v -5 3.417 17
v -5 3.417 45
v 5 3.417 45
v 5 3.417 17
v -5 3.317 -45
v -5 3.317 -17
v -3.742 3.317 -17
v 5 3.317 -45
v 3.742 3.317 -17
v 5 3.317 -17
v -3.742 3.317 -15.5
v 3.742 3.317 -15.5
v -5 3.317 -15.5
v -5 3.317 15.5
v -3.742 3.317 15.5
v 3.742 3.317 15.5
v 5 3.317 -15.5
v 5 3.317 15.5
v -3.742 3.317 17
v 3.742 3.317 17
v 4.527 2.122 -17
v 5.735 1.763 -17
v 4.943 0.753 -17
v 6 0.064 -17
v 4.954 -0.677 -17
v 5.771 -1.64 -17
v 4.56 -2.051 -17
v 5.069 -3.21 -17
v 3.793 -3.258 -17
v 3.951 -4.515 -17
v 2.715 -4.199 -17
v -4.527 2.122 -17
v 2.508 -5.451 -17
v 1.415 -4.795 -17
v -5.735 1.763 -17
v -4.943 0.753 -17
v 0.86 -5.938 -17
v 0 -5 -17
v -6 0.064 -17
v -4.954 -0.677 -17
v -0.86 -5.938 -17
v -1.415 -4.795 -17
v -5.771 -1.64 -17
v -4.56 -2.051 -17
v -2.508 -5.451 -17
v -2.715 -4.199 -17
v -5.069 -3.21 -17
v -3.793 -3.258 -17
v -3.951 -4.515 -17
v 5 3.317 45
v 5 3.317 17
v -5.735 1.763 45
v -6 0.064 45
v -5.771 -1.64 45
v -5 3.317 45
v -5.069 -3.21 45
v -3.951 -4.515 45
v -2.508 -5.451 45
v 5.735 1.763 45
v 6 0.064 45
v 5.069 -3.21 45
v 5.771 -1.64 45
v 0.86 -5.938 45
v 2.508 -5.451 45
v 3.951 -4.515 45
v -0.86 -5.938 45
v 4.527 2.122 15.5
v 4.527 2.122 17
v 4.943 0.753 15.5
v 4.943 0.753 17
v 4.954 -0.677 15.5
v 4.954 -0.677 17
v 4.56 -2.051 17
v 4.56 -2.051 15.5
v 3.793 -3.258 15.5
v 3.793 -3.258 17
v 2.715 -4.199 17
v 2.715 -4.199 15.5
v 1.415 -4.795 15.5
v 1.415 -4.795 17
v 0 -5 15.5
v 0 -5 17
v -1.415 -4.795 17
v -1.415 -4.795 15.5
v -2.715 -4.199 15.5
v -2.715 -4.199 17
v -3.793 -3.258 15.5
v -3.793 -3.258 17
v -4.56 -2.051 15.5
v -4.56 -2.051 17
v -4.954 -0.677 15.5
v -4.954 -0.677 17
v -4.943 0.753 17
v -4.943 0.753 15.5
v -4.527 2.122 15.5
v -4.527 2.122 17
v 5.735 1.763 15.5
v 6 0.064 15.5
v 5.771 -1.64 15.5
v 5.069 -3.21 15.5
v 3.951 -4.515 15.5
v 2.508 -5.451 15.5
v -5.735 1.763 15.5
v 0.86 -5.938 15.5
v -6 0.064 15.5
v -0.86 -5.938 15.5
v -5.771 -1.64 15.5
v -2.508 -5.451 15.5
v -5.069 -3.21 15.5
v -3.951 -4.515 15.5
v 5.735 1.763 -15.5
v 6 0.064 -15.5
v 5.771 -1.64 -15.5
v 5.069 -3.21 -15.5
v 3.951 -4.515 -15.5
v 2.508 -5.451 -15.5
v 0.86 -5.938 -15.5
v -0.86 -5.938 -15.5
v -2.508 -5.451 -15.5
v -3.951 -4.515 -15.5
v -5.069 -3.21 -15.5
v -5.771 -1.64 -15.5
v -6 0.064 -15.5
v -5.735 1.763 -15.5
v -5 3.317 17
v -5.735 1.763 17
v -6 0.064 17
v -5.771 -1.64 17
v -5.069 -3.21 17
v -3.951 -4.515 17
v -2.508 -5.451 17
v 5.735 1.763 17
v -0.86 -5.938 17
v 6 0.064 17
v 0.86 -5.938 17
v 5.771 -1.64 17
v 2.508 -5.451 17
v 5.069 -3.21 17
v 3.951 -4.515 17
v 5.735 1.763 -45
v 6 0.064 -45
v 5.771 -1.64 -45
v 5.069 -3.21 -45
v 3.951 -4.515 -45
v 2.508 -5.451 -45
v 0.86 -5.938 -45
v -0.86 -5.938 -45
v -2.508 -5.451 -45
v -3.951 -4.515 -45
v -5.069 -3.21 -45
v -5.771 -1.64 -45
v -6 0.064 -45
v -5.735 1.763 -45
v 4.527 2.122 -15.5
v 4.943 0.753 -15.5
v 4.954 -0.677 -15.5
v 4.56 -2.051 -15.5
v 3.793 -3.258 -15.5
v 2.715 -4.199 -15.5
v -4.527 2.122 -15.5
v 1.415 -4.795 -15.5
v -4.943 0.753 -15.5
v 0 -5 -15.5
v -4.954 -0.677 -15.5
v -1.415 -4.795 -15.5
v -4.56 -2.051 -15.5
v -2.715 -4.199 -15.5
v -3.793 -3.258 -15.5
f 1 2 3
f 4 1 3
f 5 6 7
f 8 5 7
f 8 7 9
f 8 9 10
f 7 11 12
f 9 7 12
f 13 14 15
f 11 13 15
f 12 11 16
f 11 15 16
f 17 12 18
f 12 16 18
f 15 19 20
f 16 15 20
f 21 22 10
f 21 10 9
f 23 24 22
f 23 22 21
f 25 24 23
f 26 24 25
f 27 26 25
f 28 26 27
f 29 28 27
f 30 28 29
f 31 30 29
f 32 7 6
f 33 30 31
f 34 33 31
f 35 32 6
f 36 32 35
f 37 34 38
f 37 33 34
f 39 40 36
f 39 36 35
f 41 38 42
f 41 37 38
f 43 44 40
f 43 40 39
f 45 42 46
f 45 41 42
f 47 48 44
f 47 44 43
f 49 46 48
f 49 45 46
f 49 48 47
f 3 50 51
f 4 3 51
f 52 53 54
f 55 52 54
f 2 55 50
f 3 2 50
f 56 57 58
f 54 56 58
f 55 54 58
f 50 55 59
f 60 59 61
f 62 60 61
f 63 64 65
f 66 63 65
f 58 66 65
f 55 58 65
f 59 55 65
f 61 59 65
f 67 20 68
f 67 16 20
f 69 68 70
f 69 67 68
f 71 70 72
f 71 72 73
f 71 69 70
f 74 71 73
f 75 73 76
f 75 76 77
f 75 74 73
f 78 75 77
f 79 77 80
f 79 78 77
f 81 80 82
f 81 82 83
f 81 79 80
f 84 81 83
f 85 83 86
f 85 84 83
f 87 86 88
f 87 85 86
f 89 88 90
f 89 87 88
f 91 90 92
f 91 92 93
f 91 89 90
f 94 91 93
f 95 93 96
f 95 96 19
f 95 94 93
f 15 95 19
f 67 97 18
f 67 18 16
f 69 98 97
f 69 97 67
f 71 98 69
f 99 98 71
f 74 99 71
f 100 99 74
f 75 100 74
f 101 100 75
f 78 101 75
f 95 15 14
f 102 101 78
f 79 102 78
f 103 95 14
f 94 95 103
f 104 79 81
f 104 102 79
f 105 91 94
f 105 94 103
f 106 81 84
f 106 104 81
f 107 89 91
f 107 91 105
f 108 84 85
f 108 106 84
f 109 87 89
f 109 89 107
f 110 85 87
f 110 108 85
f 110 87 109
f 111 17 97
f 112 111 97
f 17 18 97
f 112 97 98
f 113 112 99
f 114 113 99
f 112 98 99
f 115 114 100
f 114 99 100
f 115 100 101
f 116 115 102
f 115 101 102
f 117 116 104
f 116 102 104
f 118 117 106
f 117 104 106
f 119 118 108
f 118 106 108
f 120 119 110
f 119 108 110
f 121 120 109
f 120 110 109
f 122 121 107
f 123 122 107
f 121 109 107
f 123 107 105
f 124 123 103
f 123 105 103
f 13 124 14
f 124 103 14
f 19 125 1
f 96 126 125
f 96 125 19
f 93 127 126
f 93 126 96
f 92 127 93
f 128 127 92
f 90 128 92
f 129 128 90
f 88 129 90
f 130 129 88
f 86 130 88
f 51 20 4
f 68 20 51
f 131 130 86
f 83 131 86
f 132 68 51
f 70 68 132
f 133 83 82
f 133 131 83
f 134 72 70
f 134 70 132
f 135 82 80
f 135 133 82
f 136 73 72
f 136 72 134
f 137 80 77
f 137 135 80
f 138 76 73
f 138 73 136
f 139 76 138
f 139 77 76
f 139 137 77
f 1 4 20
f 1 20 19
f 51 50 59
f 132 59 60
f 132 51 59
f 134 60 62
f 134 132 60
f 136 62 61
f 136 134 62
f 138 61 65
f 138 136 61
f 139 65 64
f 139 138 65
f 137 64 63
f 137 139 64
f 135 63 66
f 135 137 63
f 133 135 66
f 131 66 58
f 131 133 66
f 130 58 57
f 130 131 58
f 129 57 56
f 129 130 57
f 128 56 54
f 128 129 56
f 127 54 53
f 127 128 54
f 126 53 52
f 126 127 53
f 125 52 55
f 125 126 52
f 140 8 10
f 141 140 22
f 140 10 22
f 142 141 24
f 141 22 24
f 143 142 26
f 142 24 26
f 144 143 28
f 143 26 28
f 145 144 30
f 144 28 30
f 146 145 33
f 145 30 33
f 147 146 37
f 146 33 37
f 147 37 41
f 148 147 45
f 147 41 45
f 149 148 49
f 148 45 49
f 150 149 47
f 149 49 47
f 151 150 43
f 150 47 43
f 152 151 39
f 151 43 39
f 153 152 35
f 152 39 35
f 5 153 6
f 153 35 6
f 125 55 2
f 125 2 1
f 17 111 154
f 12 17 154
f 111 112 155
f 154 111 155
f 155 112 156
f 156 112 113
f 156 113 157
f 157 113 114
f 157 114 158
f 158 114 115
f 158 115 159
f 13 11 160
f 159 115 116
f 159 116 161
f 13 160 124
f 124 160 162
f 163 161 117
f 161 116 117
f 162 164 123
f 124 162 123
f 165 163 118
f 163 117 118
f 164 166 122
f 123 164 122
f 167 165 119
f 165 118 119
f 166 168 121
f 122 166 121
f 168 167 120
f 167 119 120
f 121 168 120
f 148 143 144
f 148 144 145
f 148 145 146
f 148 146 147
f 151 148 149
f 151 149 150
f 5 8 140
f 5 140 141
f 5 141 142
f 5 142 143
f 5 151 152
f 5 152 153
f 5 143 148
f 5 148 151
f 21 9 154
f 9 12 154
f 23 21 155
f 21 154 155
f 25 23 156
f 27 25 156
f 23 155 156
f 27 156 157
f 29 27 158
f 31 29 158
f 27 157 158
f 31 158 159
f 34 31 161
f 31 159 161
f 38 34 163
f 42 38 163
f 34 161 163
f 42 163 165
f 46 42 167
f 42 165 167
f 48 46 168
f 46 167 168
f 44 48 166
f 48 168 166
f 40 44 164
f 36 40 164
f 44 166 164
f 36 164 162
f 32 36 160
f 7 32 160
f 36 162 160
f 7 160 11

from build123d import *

# Parameters (mm, degrees)
EXTRUDE_1_DEPTH = 45
SKETCH_2_W      = 1
SKETCH_2_H      = 1.5
SKETCH_3_W      = 10
SKETCH_3_H      = 28
EXTRUDE_2_DEPTH = 0.1


with BuildPart() as part:
    # Эскиз1 → Бобышка-Вытянуть1 (new body)
    with BuildSketch(Plane.XY):
        with BuildLine():
            Line((-5, 3.31662479), (5, 3.31662479))
            ThreePointArc((5, 3.31662479), (0, -6), (-5, 3.31662479))
        make_face()
    extrude(amount=EXTRUDE_1_DEPTH)

    # Эскиз2 → Вырез-Повернуть1 (revolve, cut)
    with BuildSketch(Plane(origin=(0, 0, 0), x_dir=(1, 0, 0), z_dir=(0, 1, 0))):
        with Locations((5.5, -16.25)):
            Rectangle(SKETCH_2_W, SKETCH_2_H)
    revolve(axis=Axis((0, 0, 1000), (0, 0, -1)), mode=Mode.SUBTRACT)

    # Зеркальное отражение1: part across plane


with BuildPart() as part_1:
    add(part.part)
    add(part.part.mirror(Plane.XY))

    # Эскиз3 → Бобышка-Вытянуть2 (add)
    with BuildSketch(Plane(origin=(0, 3.31662479, 0), x_dir=(1, 0, 0), z_dir=(0, 1, 0))):
        with Locations((0, -31)):
            Rectangle(SKETCH_3_W, SKETCH_3_H)
    extrude(amount=EXTRUDE_2_DEPTH)


solid = part_1.part
